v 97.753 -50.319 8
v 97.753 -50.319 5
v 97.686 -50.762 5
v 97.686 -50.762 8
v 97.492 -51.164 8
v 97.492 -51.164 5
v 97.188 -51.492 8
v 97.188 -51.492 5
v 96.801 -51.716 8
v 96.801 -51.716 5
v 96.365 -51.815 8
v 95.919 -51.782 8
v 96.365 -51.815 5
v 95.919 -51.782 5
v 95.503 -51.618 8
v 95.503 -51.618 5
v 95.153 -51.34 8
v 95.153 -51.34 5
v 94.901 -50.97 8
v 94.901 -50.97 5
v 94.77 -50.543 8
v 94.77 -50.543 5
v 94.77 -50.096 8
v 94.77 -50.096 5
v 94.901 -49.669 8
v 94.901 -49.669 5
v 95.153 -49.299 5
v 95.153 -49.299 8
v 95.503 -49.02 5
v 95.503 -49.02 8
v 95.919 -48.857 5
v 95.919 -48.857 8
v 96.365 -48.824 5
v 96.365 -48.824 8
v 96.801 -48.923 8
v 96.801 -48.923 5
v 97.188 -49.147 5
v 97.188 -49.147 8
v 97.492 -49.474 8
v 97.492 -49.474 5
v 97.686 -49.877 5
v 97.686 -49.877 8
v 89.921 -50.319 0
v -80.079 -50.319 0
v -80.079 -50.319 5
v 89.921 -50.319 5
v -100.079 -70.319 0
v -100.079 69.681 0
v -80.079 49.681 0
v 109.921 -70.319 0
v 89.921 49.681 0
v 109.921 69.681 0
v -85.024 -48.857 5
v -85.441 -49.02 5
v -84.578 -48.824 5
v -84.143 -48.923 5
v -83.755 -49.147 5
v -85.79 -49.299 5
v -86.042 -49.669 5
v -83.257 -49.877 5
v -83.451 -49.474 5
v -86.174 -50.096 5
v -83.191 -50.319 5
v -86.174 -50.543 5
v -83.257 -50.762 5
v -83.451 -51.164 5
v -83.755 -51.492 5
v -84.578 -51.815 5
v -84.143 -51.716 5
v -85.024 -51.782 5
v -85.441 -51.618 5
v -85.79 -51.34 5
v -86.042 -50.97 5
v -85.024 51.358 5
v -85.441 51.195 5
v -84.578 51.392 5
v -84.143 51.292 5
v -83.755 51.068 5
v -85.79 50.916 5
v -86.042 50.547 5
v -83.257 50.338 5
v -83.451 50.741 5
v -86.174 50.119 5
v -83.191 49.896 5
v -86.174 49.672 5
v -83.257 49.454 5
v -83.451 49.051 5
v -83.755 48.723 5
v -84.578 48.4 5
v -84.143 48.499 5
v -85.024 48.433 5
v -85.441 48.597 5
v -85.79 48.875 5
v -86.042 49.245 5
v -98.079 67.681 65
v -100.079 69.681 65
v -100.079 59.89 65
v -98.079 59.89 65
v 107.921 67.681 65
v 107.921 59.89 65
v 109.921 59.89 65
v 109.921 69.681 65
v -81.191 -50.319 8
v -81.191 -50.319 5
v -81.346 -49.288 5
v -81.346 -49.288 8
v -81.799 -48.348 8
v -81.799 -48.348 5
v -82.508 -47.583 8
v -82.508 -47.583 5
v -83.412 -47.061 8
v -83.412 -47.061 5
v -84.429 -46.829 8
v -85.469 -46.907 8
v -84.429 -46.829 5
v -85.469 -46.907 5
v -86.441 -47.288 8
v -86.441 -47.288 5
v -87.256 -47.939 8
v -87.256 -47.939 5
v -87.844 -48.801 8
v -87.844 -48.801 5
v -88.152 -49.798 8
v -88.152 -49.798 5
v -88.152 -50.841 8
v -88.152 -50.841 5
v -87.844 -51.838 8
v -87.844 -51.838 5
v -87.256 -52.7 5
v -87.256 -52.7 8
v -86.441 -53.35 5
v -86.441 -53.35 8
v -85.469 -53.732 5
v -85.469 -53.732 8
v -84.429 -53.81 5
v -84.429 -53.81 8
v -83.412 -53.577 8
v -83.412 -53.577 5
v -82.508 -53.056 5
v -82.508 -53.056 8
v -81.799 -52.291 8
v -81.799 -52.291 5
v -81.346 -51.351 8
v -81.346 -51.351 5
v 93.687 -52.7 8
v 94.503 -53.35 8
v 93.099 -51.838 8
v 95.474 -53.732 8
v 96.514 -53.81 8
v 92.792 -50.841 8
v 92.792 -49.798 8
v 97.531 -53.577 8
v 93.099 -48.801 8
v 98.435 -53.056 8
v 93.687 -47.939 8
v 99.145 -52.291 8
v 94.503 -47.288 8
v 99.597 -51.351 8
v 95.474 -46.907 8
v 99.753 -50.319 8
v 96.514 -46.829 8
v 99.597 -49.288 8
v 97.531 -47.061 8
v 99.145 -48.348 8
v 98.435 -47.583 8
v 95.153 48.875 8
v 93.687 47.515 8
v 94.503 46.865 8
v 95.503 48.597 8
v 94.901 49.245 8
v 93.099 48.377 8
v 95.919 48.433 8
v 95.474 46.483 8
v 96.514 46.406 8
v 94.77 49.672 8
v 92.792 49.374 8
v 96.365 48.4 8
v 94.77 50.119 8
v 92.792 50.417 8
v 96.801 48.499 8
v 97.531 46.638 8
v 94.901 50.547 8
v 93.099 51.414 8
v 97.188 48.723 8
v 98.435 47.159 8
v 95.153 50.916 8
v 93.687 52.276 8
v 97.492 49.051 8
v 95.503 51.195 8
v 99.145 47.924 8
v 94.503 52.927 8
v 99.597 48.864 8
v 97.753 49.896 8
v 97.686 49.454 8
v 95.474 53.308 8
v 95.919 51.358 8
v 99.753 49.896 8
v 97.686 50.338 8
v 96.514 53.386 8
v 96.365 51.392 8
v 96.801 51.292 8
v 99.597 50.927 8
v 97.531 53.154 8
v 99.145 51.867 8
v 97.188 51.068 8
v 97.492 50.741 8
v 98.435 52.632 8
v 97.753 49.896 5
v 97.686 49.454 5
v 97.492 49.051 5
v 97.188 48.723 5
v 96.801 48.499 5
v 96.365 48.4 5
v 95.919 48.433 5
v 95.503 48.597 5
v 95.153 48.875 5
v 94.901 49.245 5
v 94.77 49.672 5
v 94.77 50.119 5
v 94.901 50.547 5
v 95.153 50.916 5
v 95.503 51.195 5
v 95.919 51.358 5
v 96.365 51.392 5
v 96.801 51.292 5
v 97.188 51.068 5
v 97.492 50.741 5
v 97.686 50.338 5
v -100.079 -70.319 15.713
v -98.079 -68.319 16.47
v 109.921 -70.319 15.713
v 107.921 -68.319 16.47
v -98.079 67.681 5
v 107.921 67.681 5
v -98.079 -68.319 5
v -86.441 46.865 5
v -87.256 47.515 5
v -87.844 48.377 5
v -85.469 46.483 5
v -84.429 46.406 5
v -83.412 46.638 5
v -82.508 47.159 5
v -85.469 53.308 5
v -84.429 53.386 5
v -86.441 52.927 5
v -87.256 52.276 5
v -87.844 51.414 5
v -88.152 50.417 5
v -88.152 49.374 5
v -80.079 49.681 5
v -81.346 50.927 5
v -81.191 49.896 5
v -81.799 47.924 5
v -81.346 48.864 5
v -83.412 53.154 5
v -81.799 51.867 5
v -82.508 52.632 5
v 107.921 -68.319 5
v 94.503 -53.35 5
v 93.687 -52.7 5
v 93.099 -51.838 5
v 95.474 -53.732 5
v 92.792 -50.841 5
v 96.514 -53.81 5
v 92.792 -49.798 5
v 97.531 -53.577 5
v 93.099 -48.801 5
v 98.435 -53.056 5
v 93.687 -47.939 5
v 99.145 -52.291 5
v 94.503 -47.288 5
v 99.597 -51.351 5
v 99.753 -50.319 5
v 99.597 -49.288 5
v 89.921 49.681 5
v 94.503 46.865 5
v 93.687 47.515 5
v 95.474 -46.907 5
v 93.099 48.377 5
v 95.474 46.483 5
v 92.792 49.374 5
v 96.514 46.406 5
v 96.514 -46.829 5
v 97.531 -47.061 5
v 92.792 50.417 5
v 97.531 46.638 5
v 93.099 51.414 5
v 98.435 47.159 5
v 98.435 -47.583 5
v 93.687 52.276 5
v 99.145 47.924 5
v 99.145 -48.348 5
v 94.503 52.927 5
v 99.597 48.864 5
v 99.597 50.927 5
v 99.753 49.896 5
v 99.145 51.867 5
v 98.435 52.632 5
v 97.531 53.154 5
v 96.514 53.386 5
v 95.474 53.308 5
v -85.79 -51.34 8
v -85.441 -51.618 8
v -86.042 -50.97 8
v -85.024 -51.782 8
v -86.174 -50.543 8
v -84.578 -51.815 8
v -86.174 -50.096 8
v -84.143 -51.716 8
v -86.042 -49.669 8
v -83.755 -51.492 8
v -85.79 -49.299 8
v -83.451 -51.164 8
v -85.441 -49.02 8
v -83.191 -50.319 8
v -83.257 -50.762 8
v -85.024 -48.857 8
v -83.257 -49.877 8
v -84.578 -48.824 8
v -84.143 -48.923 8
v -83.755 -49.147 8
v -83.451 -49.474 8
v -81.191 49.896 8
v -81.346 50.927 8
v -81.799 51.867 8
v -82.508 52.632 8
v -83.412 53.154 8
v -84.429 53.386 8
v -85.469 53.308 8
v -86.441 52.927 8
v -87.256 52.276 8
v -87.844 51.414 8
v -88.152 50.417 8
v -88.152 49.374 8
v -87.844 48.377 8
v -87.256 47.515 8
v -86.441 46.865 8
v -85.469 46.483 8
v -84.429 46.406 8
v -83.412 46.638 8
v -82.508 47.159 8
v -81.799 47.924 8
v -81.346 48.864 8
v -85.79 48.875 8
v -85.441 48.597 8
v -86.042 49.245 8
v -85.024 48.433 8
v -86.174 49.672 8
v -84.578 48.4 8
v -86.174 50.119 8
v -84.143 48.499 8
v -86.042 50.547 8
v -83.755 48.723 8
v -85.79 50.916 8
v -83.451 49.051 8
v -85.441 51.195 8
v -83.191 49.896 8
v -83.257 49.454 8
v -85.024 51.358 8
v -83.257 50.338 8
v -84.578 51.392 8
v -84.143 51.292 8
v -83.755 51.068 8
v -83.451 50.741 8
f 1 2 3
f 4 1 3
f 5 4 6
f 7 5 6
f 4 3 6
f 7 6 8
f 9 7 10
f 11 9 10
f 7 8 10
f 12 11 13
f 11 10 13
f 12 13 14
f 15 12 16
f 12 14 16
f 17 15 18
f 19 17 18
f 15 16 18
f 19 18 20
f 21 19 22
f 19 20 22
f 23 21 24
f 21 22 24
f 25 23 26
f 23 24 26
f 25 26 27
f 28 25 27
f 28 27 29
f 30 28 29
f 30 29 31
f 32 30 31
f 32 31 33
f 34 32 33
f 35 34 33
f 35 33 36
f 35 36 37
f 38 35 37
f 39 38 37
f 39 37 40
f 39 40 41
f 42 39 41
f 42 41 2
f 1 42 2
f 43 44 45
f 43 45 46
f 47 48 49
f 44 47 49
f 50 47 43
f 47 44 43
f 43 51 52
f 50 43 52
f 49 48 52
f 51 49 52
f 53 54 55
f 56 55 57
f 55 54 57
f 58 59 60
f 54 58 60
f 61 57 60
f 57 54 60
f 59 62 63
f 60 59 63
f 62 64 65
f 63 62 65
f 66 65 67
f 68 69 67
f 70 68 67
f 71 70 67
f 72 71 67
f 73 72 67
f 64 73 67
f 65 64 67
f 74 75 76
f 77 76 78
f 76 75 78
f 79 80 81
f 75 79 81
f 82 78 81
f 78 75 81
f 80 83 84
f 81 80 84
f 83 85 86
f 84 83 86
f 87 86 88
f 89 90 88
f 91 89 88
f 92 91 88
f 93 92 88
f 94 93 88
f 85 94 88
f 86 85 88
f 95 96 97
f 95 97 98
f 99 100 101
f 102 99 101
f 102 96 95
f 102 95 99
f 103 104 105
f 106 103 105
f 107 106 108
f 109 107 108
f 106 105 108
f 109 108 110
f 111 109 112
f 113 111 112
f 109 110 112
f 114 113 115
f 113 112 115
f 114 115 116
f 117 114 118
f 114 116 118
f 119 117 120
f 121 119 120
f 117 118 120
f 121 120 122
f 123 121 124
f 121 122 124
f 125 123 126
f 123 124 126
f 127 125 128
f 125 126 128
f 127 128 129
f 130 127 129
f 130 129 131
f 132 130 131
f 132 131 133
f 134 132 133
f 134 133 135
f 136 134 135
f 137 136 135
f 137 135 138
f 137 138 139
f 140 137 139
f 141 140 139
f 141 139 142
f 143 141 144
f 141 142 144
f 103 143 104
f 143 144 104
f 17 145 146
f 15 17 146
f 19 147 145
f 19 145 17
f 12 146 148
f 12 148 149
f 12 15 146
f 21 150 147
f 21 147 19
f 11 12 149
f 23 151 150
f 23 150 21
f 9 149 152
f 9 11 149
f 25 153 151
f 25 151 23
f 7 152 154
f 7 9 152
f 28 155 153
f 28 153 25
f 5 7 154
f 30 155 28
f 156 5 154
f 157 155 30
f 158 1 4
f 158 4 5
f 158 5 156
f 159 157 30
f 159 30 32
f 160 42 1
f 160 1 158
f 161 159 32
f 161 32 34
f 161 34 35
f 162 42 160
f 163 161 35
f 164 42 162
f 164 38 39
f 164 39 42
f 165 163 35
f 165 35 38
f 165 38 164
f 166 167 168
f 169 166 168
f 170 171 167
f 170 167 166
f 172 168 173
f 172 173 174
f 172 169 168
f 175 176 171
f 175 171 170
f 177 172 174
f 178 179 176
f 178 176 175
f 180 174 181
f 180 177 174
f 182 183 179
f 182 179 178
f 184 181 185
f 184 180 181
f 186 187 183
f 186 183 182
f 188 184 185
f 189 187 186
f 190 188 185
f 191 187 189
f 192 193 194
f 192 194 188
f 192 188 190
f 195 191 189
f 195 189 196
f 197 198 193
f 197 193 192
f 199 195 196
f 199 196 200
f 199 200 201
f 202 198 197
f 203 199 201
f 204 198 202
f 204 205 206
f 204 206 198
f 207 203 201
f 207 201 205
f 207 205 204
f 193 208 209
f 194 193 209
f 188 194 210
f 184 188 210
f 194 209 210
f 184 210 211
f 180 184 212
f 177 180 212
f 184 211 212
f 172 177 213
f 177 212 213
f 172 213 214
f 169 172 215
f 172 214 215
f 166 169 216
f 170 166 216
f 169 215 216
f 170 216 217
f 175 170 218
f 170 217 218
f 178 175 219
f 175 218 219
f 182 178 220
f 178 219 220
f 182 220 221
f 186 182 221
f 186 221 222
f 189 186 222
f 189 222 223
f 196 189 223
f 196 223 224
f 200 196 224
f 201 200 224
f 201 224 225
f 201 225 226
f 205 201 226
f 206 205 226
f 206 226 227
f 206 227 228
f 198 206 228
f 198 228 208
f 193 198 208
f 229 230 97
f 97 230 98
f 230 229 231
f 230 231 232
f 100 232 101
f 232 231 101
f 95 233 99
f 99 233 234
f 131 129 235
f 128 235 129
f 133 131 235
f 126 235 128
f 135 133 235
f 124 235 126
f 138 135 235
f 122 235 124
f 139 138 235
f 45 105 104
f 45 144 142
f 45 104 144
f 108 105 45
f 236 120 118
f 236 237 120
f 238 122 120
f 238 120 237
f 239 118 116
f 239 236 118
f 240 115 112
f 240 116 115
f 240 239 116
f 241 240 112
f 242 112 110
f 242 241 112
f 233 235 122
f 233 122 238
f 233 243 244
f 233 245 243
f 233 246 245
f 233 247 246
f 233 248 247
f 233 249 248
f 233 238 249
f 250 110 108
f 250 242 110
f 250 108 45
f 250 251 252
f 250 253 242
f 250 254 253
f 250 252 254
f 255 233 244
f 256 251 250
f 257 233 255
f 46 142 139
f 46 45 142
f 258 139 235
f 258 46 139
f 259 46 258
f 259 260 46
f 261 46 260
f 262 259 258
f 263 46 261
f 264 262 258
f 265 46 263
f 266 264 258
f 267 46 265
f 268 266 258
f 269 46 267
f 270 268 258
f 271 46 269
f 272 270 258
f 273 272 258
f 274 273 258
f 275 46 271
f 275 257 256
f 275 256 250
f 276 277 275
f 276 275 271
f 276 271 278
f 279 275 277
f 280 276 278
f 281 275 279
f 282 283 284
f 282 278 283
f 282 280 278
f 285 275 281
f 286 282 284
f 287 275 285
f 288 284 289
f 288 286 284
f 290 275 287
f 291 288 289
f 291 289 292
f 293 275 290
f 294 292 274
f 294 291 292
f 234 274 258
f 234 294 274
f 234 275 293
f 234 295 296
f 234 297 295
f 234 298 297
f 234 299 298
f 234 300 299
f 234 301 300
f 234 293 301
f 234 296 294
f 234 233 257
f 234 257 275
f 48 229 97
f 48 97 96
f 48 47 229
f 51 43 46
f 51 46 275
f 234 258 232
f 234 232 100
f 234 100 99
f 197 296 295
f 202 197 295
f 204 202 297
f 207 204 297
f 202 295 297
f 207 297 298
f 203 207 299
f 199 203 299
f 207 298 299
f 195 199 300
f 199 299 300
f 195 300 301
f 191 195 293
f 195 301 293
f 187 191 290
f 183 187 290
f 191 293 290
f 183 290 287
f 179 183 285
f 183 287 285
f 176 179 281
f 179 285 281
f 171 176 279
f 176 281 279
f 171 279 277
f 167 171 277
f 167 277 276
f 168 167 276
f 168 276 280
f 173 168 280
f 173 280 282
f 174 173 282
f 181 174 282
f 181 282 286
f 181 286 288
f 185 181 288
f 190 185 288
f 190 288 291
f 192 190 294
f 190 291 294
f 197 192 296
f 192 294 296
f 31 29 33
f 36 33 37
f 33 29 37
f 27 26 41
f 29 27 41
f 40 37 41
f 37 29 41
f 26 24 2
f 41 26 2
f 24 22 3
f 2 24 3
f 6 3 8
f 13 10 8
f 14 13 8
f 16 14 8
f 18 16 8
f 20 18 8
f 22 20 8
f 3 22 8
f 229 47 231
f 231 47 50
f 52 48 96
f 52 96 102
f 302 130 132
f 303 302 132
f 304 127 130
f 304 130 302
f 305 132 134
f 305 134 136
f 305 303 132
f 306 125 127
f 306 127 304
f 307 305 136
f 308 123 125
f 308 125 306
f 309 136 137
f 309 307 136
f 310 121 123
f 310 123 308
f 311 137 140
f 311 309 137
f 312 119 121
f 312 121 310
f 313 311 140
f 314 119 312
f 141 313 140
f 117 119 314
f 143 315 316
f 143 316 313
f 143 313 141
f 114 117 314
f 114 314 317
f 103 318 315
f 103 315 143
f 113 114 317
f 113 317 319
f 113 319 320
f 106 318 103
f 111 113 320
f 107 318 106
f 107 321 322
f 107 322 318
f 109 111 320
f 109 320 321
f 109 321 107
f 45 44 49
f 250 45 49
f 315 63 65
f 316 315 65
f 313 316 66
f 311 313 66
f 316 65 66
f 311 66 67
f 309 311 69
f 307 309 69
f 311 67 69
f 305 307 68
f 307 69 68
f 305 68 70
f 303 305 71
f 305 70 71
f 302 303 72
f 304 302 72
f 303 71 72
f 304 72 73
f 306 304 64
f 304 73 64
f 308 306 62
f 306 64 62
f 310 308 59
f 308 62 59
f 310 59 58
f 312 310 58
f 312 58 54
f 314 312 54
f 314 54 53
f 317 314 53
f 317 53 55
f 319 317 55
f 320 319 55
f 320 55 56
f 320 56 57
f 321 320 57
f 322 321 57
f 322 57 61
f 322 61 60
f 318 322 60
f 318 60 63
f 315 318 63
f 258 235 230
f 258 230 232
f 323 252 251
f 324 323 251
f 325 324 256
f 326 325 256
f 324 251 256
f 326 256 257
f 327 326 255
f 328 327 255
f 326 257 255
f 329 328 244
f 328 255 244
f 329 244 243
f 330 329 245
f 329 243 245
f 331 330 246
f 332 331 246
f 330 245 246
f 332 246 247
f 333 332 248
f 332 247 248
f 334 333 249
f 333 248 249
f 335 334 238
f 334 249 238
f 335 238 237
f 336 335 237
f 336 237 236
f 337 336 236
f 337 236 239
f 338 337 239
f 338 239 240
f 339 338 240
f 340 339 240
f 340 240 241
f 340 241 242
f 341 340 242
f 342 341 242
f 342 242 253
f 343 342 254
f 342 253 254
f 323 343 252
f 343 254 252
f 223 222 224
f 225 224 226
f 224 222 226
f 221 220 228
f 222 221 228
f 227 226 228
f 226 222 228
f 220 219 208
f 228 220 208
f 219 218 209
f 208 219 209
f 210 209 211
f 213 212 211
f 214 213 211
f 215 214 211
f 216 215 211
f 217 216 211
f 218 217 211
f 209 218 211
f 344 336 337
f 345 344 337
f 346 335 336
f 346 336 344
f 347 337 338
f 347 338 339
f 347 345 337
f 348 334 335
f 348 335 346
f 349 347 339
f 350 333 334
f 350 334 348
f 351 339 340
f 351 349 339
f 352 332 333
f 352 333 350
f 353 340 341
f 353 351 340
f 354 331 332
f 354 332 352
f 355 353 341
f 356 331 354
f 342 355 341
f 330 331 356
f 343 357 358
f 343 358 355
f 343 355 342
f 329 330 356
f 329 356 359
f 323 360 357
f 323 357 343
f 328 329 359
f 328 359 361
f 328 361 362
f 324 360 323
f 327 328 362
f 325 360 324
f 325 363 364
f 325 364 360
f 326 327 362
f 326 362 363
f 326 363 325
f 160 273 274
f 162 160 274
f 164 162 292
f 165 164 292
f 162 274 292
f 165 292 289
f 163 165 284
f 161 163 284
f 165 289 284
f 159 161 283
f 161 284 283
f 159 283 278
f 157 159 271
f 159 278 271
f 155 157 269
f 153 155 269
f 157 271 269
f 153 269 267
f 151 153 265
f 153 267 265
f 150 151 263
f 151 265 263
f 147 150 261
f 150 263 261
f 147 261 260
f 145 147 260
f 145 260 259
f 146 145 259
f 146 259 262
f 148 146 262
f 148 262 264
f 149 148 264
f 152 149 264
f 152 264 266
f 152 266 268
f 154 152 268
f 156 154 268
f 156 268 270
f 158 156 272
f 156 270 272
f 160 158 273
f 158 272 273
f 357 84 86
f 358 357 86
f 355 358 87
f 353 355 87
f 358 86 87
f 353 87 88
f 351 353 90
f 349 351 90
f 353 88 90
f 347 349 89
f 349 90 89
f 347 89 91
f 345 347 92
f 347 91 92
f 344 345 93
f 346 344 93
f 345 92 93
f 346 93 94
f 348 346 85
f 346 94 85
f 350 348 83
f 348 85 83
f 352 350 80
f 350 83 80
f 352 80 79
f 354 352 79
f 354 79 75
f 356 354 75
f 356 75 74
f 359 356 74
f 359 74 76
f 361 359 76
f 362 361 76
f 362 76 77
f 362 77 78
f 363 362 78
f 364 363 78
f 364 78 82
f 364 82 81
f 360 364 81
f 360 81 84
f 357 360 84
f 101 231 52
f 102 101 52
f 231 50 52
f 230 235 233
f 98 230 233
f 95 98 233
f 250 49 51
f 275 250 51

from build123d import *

# Parameters (mm, degrees)
F0_W     = 210
F0_H     = 140
F0_W_2   = 170
F0_H_2   = 100
F1_DEPTH = 5
F2_W     = 210
F2_H     = 140
F2_W_2   = 206
F2_H_2   = 136
F3_DEPTH = 60
F2_R     = 3.5
F4_DEPTH = 3
F5_D     = 3
F5_DEPTH = 15
F5_TIP   = 0.9012909285
F7_DEPTH = 300


with BuildPart() as f1:
    # F0 (on Top) → F1 (new body)
    with BuildSketch(Plane.XY):
        with Locations((4.9210386318, -0.3193840384)):
            Rectangle(F0_W, F0_H)
        with Locations((4.9210386318, -0.3193840384)):
            Rectangle(F0_W_2, F0_H_2, mode=Mode.SUBTRACT)
    extrude(amount=F1_DEPTH)

    # F2 (on face) → F3 (join)
    with BuildSketch(Plane.XY.offset(5)):
        with Locations((4.9210386318, -0.3193840384)):
            Rectangle(F2_W, F2_H)
        with Locations((4.9210386318, -0.3193840384)):
            Rectangle(F2_W_2, F2_H_2, mode=Mode.SUBTRACT)
    extrude(amount=F3_DEPTH)

    # F2 (on face) → F4 (join)
    with BuildSketch(Plane.XY.offset(5)):
        with Locations((-84.690593183, 49.8957410455)):
            Circle(F2_R)
        with Locations((96.2527468801, 49.8957410455)):
            Circle(F2_R)
        with Locations((-84.690593183, -50.3193840384)):
            Circle(F2_R)
        with Locations((96.2527468801, -50.3193840384)):
            Circle(F2_R)
    extrude(amount=F4_DEPTH)

    # F5 (one way)
    with BuildSketch(Plane(origin=(0, 0, 5), x_dir=(1, 0, 0), z_dir=(0, 0, -1))):
        with Locations((-84.690593183, -49.8957410455), (96.2527468801, -49.8957410455), (-84.690593183, 50.3193840384), (96.2527468801, 50.3193840384)):
            Circle(F5_D / 2)
    extrude(amount=-F5_DEPTH, mode=Mode.SUBTRACT)
    with Locations(Plane(origin=(0, 0, 5), x_dir=(1, 0, 0), z_dir=(0, 0, -1))):
        with Locations((-84.690593183, -49.8957410455), (96.2527468801, -49.8957410455), (-84.690593183, 50.3193840384), (96.2527468801, 50.3193840384)):
            with Locations((0, 0, -(F5_DEPTH + F5_TIP / 2))):  # 118° drill point
                Cone(0, F5_D / 2, F5_TIP, mode=Mode.SUBTRACT)

    # F6 (on face) → F7 (cut)
    with BuildSketch(Plane.YZ.offset(109.9210386318)):
        Polygon((-94.7846397758, 6.4518074505), (80.1731944084, 72.6777166128), (-94.7846397758, 76.6626521945), align=None)
    extrude(amount=-F7_DEPTH, mode=Mode.SUBTRACT)


solid = f1.part
